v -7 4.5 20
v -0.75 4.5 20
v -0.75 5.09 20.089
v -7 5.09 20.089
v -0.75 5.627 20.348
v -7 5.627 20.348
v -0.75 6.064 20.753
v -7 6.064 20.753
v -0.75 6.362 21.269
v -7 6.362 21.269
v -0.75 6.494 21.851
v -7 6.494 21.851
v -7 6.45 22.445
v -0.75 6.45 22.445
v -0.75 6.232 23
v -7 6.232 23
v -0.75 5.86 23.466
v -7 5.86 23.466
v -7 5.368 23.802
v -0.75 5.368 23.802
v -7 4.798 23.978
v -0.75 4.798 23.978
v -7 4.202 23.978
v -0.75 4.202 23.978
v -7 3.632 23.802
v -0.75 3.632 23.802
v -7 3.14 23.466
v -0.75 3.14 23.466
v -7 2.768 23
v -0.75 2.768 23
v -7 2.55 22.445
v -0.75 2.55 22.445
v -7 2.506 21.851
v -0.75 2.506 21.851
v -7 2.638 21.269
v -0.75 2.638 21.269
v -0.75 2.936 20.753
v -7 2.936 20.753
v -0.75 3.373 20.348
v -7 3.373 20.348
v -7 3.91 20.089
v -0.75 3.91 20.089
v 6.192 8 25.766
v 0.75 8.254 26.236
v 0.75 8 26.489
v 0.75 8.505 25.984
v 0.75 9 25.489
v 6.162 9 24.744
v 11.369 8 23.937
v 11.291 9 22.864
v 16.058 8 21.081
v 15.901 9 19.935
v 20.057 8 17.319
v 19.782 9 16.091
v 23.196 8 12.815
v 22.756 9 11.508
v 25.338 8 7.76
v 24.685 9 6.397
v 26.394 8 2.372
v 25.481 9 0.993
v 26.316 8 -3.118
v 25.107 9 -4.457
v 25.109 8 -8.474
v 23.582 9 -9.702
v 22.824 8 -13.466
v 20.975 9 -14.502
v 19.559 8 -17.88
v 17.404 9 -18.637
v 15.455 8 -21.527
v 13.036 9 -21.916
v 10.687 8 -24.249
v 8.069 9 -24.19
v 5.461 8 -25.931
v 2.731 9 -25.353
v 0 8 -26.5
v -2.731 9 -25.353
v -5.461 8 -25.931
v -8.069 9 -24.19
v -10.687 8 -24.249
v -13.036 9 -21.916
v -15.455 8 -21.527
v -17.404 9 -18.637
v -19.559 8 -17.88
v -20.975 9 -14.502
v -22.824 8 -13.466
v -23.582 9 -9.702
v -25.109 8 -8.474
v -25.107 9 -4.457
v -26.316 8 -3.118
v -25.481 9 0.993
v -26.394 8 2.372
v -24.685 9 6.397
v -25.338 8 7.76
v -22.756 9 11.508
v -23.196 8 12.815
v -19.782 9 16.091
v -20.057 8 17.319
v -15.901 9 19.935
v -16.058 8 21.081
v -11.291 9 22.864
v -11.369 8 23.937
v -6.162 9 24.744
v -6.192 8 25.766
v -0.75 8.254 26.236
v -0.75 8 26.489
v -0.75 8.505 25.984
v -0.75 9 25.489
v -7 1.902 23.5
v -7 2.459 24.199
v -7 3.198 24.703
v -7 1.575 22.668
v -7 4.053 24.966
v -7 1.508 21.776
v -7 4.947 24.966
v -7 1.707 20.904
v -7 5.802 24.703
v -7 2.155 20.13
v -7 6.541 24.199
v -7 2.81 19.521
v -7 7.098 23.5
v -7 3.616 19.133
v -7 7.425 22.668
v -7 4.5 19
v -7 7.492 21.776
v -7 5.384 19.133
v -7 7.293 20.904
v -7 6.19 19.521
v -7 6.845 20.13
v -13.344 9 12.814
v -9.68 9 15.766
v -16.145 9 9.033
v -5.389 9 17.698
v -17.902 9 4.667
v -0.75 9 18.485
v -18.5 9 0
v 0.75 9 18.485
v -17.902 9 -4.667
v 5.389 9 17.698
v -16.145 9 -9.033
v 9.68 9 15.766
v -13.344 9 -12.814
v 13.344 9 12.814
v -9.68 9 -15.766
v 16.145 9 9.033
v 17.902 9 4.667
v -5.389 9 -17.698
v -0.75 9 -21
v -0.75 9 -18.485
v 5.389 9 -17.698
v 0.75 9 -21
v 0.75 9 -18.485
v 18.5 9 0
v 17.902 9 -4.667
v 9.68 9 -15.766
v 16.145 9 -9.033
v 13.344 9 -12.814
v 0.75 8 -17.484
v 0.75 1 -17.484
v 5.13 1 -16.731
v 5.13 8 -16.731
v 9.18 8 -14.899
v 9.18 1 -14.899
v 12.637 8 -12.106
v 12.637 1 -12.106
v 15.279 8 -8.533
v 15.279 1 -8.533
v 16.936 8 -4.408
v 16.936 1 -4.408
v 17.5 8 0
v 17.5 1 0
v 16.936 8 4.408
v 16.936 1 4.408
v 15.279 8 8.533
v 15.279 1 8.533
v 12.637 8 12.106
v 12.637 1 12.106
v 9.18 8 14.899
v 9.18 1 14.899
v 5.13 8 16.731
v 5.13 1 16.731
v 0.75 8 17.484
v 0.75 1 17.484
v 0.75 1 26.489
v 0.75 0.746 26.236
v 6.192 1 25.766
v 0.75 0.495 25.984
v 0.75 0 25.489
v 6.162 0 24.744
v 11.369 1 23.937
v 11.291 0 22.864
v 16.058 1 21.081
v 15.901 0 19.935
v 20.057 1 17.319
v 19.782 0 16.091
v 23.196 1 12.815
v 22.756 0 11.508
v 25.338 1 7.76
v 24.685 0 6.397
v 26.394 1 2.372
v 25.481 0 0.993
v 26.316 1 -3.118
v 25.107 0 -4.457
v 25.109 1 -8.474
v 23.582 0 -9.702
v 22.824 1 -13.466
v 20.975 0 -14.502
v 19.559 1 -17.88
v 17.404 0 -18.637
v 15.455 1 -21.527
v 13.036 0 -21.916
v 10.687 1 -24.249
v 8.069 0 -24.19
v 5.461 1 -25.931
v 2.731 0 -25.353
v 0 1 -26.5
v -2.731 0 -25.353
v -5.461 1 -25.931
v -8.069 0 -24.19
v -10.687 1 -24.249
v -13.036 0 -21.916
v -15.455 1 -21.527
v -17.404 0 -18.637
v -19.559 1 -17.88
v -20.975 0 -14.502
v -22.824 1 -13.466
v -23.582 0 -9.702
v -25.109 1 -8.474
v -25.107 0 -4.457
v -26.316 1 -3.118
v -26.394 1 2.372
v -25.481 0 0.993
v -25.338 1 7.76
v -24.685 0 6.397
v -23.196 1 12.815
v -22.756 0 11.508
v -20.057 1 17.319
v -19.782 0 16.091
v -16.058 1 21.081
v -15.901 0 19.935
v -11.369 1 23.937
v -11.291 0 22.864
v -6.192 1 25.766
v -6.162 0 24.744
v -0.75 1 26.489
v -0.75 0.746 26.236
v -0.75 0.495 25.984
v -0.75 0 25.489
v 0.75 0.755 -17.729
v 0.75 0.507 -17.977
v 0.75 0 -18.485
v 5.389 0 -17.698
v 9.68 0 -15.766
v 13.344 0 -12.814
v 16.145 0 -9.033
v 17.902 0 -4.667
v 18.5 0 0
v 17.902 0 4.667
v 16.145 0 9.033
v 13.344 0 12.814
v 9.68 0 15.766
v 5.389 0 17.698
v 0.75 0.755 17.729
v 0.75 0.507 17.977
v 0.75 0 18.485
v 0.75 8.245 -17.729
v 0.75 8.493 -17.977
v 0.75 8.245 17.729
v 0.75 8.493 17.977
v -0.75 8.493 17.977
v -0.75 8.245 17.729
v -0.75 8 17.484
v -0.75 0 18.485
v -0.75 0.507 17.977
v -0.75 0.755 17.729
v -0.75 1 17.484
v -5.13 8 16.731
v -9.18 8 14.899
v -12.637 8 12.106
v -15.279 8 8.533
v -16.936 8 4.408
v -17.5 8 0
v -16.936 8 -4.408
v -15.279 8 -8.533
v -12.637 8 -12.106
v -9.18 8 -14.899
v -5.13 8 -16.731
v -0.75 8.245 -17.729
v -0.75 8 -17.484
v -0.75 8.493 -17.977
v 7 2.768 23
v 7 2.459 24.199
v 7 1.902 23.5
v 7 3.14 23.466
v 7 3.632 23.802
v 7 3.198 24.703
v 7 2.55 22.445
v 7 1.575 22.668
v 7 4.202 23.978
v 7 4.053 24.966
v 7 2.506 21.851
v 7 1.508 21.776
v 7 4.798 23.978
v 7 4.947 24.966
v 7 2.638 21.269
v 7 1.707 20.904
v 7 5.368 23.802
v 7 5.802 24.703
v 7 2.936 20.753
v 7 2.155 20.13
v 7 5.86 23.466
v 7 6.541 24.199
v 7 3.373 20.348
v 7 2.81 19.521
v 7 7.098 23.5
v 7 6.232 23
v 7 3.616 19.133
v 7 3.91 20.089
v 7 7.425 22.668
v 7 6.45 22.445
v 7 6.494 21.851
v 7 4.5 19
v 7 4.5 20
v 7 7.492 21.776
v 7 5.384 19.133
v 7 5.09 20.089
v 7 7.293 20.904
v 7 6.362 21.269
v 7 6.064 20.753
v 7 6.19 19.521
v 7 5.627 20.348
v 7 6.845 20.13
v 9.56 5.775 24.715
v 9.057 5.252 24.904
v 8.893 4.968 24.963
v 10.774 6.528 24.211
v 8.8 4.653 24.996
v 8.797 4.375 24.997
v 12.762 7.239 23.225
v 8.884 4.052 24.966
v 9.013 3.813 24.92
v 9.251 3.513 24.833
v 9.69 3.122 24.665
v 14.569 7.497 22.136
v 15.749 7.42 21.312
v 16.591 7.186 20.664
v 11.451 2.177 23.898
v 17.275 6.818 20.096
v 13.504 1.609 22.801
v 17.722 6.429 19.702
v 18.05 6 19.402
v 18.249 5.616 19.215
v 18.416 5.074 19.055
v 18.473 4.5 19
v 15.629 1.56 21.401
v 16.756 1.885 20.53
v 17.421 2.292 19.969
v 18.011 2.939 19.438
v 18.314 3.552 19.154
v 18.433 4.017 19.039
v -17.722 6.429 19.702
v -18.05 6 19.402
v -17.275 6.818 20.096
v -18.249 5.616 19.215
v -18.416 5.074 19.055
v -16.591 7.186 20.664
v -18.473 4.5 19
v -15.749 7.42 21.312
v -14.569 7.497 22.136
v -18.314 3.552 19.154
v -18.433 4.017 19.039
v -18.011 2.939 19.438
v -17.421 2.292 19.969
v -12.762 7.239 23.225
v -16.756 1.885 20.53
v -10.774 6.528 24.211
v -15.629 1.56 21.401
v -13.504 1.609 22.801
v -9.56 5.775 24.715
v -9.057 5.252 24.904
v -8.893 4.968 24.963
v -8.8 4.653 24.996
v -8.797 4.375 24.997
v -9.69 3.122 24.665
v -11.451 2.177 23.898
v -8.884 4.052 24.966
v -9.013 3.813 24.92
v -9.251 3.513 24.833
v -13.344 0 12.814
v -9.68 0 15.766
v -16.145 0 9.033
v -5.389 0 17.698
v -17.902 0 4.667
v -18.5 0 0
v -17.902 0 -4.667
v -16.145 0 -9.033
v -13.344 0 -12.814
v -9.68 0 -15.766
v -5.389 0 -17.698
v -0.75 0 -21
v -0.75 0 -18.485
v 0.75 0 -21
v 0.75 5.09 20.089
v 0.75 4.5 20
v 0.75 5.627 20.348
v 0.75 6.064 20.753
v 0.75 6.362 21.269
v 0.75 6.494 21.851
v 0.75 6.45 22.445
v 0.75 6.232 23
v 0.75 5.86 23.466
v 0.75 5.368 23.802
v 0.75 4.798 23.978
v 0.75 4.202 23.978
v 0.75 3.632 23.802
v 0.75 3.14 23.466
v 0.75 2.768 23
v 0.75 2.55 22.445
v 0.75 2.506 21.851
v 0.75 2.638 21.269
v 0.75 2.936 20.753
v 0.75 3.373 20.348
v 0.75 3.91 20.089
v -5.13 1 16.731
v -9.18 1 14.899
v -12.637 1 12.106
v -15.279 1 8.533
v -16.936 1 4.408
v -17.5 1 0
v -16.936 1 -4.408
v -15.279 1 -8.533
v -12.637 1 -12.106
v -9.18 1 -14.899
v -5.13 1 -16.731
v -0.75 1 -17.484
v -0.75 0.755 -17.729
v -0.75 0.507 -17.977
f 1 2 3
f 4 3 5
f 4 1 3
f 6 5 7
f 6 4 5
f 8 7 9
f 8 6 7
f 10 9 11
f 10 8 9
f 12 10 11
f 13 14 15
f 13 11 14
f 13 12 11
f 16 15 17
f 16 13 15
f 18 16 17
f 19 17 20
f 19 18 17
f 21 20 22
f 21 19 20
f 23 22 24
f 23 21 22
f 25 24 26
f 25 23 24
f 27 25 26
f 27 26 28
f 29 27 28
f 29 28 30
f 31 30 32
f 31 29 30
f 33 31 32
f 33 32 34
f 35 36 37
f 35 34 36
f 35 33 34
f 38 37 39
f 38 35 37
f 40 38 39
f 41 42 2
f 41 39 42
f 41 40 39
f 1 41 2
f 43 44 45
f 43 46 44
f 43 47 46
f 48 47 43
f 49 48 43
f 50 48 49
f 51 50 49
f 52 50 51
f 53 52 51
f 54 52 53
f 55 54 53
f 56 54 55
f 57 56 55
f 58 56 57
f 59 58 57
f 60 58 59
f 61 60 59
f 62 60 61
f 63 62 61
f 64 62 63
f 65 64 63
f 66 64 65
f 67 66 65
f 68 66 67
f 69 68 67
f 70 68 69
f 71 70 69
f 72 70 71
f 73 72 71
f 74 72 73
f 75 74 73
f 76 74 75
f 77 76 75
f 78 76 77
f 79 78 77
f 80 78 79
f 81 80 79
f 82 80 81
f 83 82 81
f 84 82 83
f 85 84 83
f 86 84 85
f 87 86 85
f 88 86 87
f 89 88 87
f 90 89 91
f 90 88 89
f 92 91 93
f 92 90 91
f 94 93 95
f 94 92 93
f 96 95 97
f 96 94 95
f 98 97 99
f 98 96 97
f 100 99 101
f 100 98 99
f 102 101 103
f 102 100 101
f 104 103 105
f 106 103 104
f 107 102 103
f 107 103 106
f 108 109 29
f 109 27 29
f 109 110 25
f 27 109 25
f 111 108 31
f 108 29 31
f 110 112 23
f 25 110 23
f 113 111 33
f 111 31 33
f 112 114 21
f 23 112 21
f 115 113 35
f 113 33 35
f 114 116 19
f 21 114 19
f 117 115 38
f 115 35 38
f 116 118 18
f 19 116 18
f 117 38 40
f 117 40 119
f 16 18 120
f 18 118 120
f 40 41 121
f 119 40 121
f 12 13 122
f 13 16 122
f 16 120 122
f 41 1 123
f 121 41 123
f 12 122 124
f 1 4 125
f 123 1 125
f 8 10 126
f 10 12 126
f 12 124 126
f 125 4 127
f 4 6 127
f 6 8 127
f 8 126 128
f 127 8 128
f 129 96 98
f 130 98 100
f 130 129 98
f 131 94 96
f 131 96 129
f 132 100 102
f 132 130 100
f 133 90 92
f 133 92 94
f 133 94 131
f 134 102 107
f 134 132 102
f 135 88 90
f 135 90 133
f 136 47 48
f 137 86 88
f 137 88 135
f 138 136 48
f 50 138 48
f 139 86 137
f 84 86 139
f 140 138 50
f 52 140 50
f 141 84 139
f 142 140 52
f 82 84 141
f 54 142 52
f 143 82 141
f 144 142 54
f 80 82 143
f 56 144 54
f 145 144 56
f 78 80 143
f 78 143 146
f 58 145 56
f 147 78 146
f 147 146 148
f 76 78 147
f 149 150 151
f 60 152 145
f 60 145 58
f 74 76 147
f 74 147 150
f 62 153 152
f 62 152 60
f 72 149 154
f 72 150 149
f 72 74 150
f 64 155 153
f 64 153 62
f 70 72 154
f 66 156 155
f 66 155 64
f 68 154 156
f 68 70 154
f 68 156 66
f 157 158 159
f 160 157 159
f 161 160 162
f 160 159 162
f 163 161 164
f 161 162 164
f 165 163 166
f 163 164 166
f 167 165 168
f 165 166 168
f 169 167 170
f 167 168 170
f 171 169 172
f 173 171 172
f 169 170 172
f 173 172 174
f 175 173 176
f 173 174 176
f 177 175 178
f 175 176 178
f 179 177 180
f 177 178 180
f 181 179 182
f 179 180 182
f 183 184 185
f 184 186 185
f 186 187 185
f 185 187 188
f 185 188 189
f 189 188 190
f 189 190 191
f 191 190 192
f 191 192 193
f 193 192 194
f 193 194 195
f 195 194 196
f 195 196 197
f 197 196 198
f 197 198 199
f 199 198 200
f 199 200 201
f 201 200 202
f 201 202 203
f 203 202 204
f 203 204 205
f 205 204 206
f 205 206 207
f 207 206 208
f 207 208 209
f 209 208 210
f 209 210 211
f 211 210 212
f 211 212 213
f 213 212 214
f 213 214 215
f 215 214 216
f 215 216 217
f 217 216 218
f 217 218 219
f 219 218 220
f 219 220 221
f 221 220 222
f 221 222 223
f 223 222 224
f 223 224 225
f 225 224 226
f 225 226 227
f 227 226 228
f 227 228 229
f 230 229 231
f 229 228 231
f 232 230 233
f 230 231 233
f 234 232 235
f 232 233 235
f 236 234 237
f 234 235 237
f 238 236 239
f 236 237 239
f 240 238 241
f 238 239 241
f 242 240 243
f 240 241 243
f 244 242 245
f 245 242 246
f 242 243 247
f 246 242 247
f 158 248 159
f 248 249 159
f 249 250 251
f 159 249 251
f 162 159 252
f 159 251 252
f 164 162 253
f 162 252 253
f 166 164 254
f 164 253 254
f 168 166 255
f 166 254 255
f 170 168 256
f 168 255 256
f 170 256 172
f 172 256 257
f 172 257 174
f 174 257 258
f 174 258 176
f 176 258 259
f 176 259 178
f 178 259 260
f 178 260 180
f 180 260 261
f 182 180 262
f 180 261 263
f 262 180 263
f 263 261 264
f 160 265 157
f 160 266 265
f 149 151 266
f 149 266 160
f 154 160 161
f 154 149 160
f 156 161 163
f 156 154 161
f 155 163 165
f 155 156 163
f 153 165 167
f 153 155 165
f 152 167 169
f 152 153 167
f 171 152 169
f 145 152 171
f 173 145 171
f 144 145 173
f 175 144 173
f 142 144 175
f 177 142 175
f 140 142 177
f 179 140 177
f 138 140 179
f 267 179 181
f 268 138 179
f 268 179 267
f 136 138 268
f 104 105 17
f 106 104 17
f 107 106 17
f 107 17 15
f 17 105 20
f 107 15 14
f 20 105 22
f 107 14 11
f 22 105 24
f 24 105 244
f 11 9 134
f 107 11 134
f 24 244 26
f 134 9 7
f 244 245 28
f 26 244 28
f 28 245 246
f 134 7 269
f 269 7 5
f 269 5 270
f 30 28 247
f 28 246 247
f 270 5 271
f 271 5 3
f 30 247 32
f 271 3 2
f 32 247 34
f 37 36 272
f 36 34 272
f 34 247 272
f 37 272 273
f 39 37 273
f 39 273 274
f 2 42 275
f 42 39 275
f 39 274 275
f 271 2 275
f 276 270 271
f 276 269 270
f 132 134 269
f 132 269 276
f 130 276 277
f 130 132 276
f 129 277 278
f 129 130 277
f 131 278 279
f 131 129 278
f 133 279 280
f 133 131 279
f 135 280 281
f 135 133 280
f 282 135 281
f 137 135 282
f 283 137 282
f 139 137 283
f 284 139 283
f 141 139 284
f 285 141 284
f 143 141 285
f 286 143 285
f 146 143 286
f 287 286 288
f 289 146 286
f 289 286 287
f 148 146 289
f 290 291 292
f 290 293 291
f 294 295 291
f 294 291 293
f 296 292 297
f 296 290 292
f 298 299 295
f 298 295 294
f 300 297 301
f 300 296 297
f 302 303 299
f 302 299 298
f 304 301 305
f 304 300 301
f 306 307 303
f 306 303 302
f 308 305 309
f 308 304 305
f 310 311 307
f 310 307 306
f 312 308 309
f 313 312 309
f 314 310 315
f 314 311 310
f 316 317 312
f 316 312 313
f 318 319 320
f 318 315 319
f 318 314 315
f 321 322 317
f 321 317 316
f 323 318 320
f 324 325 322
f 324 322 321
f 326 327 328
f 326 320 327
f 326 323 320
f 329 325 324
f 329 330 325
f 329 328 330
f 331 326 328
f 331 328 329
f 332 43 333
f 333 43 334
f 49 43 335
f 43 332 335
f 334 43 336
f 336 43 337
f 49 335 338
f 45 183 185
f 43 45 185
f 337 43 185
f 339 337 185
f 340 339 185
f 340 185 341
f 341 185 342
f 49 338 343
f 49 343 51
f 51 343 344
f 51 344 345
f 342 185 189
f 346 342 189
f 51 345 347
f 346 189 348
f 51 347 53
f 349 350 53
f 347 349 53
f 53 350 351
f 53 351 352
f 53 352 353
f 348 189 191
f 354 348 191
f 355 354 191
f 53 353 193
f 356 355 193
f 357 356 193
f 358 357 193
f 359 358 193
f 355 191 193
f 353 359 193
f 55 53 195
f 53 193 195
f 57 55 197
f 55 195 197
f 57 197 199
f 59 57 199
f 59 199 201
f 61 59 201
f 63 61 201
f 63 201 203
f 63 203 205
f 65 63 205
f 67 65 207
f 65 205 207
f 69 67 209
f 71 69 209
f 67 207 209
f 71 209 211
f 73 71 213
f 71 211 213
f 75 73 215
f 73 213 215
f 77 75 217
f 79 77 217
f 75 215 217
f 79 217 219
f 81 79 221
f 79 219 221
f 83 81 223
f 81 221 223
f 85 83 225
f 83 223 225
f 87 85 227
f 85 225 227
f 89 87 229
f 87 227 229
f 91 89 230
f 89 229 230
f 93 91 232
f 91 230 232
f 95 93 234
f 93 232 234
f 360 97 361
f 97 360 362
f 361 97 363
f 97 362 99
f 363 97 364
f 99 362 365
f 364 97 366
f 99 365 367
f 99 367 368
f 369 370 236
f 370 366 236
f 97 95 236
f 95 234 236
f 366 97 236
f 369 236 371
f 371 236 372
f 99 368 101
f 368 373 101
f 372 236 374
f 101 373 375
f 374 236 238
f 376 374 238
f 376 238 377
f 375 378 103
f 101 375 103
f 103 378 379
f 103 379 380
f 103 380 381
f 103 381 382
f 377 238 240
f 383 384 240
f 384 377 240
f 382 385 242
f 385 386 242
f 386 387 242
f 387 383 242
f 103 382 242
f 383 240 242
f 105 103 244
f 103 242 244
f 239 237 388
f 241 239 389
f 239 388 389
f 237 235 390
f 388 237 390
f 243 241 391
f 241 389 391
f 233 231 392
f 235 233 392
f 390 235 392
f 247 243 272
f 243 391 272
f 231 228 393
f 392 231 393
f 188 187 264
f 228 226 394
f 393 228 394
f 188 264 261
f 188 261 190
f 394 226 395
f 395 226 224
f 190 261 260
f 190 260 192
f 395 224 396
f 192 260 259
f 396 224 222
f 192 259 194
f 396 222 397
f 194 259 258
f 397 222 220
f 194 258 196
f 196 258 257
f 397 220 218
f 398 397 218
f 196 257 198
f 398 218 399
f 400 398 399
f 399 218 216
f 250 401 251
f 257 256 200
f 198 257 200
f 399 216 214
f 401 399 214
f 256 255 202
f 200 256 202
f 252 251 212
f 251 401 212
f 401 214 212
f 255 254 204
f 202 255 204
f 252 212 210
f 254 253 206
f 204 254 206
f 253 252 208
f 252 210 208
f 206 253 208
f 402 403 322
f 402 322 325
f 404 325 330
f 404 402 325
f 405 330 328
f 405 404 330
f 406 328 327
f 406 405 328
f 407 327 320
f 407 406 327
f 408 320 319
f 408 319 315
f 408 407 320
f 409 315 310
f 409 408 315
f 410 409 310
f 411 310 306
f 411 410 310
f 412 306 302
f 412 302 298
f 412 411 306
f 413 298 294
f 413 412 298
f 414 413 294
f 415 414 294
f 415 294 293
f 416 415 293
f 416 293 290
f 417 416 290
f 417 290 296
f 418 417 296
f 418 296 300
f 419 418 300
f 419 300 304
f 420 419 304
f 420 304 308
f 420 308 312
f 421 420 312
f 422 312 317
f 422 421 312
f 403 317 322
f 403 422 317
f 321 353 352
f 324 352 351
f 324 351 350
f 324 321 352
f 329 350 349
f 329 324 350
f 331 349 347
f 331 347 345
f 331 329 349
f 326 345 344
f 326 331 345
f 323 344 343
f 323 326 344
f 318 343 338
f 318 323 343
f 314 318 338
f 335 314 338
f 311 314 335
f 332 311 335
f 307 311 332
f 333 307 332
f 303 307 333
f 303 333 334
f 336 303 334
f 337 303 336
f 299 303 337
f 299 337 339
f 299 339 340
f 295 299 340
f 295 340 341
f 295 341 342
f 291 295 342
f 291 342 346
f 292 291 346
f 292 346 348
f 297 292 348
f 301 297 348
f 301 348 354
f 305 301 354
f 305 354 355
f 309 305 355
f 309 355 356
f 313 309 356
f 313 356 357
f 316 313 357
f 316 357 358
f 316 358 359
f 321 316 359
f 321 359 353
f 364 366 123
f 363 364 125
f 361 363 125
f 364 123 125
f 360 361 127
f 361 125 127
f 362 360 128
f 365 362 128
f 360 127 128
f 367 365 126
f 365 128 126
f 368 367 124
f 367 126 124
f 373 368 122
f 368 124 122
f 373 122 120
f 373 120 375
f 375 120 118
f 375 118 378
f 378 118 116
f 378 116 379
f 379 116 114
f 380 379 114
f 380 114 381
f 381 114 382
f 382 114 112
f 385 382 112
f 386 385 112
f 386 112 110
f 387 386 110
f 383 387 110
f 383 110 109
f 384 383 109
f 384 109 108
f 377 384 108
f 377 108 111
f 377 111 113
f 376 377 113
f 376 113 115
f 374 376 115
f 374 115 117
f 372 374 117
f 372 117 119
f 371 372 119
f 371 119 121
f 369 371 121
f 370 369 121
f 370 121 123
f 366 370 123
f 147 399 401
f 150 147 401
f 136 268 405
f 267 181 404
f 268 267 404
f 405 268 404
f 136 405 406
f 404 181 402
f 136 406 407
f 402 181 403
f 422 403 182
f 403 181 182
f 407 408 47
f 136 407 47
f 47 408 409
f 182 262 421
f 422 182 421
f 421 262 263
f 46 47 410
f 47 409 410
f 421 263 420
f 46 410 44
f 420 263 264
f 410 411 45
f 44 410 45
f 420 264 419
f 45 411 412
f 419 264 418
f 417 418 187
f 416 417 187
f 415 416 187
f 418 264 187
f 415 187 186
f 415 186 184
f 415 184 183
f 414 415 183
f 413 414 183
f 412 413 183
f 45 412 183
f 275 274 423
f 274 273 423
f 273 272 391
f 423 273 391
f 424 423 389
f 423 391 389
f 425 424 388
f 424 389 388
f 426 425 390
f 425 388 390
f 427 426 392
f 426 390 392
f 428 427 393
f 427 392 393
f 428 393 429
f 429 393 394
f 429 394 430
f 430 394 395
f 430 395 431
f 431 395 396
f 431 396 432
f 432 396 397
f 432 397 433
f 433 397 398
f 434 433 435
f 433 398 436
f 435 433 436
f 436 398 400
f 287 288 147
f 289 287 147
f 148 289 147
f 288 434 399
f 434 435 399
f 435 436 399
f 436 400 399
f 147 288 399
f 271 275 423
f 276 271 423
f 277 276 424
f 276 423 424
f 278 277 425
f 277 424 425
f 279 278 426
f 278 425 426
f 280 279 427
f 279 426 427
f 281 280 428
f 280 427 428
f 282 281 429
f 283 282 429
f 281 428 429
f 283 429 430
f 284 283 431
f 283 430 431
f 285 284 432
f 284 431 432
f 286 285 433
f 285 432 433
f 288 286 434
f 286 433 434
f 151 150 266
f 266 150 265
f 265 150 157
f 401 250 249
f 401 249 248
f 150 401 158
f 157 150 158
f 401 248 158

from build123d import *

# Parameters (mm, degrees)
BOSS_EXTRUDE1_DEPTH     = 9
CHAMFER1_SIZE           = 1
SKETCH2_R               = 3
CUT_EXTRUDE2_DEPTH      = 27.5
CUT_EXTRUDE2_DEPTH_BACK = 27.5
SKETCH2_3_R             = 3
SKETCH2_3_R_2           = 2
BOSS_EXTRUDE2_DEPTH     = 7
SKETCH3_W               = 1.5
SKETCH3_H               = 7.004177156
CUT_EXTRUDE3_DEPTH      = 1
CUT_EXTRUDE3_DEPTH_BACK = 10


with BuildPart() as part:
    # Sketch1 → Boss-Extrude1 (new body)
    with BuildSketch(Plane(origin=(0, 0, 0), x_dir=(1, 0, 0), z_dir=(0, 1, 0))):
        with BuildLine():
            Line((-0.75, 21), (0.75, 21))
            Line((0.75, 21), (0.75, 17.483921185))
            ThreePointArc((0.75, 17.483921185), (17.5, 0), (0.75, -17.483921185))
            Line((0.75, -17.483921185), (0.75, -26.489384666))
            ThreePointArc((0.75, -26.489384666), (0, 26.5), (-0.75, -26.489384666))
            Line((-0.75, -26.489384666), (-0.75, -17.483921185))
            ThreePointArc((-0.75, -17.483921185), (-17.5, 0), (-0.75, 17.483921185))
            Line((-0.75, 17.483921185), (-0.75, 21))
        make_face()
    extrude(amount=BOSS_EXTRUDE1_DEPTH)

    # Chamfer1
    chamfer1_edges = [part.edges().sort_by_distance(p)[0] for p in [
        (-17.5, 0, 0),
        (0, 0, -26.5),
        (-17.5, 9, 0),
        (17.5, 9, 0),
        (0, 9, -26.5),
        (17.5, 0, 0),
    ]]
    chamfer(chamfer1_edges, length=CHAMFER1_SIZE)

    # Sketch2 → Cut-Extrude2 (cut, two sides)
    with BuildSketch(Plane(origin=(0, 0, 0), x_dir=(0, 0, -1), z_dir=(1, 0, 0))) as cut_extrude2_sk:
        with Locations((-22, 4.5)):
            Circle(SKETCH2_R)
    extrude(amount=CUT_EXTRUDE2_DEPTH, mode=Mode.SUBTRACT)
    extrude(cut_extrude2_sk.sketch, amount=-CUT_EXTRUDE2_DEPTH_BACK, mode=Mode.SUBTRACT)

    # Sketch2<3> → Boss-Extrude2 (add, symmetric)
    with BuildSketch(Plane(origin=(0, 0, 0), x_dir=(0, 0, -1), z_dir=(1, 0, 0))):
        with Locations((-22, 4.5)):
            Circle(SKETCH2_3_R)
        with Locations((-22, 4.5)):
            Circle(SKETCH2_3_R_2, mode=Mode.SUBTRACT)
    extrude(amount=BOSS_EXTRUDE2_DEPTH, both=True)

    # Sketch3 → Cut-Extrude3 (cut, two sides)
    with BuildSketch(Plane(origin=(0, 9, 0), x_dir=(1, 0, 0), z_dir=(0, 1, 0))) as cut_extrude3_sk:
        with Locations((0, -21.986879624)):
            Rectangle(SKETCH3_W, SKETCH3_H)
    extrude(amount=CUT_EXTRUDE3_DEPTH, mode=Mode.SUBTRACT)
    extrude(cut_extrude3_sk.sketch, amount=-CUT_EXTRUDE3_DEPTH_BACK, mode=Mode.SUBTRACT)


solid = part.part
